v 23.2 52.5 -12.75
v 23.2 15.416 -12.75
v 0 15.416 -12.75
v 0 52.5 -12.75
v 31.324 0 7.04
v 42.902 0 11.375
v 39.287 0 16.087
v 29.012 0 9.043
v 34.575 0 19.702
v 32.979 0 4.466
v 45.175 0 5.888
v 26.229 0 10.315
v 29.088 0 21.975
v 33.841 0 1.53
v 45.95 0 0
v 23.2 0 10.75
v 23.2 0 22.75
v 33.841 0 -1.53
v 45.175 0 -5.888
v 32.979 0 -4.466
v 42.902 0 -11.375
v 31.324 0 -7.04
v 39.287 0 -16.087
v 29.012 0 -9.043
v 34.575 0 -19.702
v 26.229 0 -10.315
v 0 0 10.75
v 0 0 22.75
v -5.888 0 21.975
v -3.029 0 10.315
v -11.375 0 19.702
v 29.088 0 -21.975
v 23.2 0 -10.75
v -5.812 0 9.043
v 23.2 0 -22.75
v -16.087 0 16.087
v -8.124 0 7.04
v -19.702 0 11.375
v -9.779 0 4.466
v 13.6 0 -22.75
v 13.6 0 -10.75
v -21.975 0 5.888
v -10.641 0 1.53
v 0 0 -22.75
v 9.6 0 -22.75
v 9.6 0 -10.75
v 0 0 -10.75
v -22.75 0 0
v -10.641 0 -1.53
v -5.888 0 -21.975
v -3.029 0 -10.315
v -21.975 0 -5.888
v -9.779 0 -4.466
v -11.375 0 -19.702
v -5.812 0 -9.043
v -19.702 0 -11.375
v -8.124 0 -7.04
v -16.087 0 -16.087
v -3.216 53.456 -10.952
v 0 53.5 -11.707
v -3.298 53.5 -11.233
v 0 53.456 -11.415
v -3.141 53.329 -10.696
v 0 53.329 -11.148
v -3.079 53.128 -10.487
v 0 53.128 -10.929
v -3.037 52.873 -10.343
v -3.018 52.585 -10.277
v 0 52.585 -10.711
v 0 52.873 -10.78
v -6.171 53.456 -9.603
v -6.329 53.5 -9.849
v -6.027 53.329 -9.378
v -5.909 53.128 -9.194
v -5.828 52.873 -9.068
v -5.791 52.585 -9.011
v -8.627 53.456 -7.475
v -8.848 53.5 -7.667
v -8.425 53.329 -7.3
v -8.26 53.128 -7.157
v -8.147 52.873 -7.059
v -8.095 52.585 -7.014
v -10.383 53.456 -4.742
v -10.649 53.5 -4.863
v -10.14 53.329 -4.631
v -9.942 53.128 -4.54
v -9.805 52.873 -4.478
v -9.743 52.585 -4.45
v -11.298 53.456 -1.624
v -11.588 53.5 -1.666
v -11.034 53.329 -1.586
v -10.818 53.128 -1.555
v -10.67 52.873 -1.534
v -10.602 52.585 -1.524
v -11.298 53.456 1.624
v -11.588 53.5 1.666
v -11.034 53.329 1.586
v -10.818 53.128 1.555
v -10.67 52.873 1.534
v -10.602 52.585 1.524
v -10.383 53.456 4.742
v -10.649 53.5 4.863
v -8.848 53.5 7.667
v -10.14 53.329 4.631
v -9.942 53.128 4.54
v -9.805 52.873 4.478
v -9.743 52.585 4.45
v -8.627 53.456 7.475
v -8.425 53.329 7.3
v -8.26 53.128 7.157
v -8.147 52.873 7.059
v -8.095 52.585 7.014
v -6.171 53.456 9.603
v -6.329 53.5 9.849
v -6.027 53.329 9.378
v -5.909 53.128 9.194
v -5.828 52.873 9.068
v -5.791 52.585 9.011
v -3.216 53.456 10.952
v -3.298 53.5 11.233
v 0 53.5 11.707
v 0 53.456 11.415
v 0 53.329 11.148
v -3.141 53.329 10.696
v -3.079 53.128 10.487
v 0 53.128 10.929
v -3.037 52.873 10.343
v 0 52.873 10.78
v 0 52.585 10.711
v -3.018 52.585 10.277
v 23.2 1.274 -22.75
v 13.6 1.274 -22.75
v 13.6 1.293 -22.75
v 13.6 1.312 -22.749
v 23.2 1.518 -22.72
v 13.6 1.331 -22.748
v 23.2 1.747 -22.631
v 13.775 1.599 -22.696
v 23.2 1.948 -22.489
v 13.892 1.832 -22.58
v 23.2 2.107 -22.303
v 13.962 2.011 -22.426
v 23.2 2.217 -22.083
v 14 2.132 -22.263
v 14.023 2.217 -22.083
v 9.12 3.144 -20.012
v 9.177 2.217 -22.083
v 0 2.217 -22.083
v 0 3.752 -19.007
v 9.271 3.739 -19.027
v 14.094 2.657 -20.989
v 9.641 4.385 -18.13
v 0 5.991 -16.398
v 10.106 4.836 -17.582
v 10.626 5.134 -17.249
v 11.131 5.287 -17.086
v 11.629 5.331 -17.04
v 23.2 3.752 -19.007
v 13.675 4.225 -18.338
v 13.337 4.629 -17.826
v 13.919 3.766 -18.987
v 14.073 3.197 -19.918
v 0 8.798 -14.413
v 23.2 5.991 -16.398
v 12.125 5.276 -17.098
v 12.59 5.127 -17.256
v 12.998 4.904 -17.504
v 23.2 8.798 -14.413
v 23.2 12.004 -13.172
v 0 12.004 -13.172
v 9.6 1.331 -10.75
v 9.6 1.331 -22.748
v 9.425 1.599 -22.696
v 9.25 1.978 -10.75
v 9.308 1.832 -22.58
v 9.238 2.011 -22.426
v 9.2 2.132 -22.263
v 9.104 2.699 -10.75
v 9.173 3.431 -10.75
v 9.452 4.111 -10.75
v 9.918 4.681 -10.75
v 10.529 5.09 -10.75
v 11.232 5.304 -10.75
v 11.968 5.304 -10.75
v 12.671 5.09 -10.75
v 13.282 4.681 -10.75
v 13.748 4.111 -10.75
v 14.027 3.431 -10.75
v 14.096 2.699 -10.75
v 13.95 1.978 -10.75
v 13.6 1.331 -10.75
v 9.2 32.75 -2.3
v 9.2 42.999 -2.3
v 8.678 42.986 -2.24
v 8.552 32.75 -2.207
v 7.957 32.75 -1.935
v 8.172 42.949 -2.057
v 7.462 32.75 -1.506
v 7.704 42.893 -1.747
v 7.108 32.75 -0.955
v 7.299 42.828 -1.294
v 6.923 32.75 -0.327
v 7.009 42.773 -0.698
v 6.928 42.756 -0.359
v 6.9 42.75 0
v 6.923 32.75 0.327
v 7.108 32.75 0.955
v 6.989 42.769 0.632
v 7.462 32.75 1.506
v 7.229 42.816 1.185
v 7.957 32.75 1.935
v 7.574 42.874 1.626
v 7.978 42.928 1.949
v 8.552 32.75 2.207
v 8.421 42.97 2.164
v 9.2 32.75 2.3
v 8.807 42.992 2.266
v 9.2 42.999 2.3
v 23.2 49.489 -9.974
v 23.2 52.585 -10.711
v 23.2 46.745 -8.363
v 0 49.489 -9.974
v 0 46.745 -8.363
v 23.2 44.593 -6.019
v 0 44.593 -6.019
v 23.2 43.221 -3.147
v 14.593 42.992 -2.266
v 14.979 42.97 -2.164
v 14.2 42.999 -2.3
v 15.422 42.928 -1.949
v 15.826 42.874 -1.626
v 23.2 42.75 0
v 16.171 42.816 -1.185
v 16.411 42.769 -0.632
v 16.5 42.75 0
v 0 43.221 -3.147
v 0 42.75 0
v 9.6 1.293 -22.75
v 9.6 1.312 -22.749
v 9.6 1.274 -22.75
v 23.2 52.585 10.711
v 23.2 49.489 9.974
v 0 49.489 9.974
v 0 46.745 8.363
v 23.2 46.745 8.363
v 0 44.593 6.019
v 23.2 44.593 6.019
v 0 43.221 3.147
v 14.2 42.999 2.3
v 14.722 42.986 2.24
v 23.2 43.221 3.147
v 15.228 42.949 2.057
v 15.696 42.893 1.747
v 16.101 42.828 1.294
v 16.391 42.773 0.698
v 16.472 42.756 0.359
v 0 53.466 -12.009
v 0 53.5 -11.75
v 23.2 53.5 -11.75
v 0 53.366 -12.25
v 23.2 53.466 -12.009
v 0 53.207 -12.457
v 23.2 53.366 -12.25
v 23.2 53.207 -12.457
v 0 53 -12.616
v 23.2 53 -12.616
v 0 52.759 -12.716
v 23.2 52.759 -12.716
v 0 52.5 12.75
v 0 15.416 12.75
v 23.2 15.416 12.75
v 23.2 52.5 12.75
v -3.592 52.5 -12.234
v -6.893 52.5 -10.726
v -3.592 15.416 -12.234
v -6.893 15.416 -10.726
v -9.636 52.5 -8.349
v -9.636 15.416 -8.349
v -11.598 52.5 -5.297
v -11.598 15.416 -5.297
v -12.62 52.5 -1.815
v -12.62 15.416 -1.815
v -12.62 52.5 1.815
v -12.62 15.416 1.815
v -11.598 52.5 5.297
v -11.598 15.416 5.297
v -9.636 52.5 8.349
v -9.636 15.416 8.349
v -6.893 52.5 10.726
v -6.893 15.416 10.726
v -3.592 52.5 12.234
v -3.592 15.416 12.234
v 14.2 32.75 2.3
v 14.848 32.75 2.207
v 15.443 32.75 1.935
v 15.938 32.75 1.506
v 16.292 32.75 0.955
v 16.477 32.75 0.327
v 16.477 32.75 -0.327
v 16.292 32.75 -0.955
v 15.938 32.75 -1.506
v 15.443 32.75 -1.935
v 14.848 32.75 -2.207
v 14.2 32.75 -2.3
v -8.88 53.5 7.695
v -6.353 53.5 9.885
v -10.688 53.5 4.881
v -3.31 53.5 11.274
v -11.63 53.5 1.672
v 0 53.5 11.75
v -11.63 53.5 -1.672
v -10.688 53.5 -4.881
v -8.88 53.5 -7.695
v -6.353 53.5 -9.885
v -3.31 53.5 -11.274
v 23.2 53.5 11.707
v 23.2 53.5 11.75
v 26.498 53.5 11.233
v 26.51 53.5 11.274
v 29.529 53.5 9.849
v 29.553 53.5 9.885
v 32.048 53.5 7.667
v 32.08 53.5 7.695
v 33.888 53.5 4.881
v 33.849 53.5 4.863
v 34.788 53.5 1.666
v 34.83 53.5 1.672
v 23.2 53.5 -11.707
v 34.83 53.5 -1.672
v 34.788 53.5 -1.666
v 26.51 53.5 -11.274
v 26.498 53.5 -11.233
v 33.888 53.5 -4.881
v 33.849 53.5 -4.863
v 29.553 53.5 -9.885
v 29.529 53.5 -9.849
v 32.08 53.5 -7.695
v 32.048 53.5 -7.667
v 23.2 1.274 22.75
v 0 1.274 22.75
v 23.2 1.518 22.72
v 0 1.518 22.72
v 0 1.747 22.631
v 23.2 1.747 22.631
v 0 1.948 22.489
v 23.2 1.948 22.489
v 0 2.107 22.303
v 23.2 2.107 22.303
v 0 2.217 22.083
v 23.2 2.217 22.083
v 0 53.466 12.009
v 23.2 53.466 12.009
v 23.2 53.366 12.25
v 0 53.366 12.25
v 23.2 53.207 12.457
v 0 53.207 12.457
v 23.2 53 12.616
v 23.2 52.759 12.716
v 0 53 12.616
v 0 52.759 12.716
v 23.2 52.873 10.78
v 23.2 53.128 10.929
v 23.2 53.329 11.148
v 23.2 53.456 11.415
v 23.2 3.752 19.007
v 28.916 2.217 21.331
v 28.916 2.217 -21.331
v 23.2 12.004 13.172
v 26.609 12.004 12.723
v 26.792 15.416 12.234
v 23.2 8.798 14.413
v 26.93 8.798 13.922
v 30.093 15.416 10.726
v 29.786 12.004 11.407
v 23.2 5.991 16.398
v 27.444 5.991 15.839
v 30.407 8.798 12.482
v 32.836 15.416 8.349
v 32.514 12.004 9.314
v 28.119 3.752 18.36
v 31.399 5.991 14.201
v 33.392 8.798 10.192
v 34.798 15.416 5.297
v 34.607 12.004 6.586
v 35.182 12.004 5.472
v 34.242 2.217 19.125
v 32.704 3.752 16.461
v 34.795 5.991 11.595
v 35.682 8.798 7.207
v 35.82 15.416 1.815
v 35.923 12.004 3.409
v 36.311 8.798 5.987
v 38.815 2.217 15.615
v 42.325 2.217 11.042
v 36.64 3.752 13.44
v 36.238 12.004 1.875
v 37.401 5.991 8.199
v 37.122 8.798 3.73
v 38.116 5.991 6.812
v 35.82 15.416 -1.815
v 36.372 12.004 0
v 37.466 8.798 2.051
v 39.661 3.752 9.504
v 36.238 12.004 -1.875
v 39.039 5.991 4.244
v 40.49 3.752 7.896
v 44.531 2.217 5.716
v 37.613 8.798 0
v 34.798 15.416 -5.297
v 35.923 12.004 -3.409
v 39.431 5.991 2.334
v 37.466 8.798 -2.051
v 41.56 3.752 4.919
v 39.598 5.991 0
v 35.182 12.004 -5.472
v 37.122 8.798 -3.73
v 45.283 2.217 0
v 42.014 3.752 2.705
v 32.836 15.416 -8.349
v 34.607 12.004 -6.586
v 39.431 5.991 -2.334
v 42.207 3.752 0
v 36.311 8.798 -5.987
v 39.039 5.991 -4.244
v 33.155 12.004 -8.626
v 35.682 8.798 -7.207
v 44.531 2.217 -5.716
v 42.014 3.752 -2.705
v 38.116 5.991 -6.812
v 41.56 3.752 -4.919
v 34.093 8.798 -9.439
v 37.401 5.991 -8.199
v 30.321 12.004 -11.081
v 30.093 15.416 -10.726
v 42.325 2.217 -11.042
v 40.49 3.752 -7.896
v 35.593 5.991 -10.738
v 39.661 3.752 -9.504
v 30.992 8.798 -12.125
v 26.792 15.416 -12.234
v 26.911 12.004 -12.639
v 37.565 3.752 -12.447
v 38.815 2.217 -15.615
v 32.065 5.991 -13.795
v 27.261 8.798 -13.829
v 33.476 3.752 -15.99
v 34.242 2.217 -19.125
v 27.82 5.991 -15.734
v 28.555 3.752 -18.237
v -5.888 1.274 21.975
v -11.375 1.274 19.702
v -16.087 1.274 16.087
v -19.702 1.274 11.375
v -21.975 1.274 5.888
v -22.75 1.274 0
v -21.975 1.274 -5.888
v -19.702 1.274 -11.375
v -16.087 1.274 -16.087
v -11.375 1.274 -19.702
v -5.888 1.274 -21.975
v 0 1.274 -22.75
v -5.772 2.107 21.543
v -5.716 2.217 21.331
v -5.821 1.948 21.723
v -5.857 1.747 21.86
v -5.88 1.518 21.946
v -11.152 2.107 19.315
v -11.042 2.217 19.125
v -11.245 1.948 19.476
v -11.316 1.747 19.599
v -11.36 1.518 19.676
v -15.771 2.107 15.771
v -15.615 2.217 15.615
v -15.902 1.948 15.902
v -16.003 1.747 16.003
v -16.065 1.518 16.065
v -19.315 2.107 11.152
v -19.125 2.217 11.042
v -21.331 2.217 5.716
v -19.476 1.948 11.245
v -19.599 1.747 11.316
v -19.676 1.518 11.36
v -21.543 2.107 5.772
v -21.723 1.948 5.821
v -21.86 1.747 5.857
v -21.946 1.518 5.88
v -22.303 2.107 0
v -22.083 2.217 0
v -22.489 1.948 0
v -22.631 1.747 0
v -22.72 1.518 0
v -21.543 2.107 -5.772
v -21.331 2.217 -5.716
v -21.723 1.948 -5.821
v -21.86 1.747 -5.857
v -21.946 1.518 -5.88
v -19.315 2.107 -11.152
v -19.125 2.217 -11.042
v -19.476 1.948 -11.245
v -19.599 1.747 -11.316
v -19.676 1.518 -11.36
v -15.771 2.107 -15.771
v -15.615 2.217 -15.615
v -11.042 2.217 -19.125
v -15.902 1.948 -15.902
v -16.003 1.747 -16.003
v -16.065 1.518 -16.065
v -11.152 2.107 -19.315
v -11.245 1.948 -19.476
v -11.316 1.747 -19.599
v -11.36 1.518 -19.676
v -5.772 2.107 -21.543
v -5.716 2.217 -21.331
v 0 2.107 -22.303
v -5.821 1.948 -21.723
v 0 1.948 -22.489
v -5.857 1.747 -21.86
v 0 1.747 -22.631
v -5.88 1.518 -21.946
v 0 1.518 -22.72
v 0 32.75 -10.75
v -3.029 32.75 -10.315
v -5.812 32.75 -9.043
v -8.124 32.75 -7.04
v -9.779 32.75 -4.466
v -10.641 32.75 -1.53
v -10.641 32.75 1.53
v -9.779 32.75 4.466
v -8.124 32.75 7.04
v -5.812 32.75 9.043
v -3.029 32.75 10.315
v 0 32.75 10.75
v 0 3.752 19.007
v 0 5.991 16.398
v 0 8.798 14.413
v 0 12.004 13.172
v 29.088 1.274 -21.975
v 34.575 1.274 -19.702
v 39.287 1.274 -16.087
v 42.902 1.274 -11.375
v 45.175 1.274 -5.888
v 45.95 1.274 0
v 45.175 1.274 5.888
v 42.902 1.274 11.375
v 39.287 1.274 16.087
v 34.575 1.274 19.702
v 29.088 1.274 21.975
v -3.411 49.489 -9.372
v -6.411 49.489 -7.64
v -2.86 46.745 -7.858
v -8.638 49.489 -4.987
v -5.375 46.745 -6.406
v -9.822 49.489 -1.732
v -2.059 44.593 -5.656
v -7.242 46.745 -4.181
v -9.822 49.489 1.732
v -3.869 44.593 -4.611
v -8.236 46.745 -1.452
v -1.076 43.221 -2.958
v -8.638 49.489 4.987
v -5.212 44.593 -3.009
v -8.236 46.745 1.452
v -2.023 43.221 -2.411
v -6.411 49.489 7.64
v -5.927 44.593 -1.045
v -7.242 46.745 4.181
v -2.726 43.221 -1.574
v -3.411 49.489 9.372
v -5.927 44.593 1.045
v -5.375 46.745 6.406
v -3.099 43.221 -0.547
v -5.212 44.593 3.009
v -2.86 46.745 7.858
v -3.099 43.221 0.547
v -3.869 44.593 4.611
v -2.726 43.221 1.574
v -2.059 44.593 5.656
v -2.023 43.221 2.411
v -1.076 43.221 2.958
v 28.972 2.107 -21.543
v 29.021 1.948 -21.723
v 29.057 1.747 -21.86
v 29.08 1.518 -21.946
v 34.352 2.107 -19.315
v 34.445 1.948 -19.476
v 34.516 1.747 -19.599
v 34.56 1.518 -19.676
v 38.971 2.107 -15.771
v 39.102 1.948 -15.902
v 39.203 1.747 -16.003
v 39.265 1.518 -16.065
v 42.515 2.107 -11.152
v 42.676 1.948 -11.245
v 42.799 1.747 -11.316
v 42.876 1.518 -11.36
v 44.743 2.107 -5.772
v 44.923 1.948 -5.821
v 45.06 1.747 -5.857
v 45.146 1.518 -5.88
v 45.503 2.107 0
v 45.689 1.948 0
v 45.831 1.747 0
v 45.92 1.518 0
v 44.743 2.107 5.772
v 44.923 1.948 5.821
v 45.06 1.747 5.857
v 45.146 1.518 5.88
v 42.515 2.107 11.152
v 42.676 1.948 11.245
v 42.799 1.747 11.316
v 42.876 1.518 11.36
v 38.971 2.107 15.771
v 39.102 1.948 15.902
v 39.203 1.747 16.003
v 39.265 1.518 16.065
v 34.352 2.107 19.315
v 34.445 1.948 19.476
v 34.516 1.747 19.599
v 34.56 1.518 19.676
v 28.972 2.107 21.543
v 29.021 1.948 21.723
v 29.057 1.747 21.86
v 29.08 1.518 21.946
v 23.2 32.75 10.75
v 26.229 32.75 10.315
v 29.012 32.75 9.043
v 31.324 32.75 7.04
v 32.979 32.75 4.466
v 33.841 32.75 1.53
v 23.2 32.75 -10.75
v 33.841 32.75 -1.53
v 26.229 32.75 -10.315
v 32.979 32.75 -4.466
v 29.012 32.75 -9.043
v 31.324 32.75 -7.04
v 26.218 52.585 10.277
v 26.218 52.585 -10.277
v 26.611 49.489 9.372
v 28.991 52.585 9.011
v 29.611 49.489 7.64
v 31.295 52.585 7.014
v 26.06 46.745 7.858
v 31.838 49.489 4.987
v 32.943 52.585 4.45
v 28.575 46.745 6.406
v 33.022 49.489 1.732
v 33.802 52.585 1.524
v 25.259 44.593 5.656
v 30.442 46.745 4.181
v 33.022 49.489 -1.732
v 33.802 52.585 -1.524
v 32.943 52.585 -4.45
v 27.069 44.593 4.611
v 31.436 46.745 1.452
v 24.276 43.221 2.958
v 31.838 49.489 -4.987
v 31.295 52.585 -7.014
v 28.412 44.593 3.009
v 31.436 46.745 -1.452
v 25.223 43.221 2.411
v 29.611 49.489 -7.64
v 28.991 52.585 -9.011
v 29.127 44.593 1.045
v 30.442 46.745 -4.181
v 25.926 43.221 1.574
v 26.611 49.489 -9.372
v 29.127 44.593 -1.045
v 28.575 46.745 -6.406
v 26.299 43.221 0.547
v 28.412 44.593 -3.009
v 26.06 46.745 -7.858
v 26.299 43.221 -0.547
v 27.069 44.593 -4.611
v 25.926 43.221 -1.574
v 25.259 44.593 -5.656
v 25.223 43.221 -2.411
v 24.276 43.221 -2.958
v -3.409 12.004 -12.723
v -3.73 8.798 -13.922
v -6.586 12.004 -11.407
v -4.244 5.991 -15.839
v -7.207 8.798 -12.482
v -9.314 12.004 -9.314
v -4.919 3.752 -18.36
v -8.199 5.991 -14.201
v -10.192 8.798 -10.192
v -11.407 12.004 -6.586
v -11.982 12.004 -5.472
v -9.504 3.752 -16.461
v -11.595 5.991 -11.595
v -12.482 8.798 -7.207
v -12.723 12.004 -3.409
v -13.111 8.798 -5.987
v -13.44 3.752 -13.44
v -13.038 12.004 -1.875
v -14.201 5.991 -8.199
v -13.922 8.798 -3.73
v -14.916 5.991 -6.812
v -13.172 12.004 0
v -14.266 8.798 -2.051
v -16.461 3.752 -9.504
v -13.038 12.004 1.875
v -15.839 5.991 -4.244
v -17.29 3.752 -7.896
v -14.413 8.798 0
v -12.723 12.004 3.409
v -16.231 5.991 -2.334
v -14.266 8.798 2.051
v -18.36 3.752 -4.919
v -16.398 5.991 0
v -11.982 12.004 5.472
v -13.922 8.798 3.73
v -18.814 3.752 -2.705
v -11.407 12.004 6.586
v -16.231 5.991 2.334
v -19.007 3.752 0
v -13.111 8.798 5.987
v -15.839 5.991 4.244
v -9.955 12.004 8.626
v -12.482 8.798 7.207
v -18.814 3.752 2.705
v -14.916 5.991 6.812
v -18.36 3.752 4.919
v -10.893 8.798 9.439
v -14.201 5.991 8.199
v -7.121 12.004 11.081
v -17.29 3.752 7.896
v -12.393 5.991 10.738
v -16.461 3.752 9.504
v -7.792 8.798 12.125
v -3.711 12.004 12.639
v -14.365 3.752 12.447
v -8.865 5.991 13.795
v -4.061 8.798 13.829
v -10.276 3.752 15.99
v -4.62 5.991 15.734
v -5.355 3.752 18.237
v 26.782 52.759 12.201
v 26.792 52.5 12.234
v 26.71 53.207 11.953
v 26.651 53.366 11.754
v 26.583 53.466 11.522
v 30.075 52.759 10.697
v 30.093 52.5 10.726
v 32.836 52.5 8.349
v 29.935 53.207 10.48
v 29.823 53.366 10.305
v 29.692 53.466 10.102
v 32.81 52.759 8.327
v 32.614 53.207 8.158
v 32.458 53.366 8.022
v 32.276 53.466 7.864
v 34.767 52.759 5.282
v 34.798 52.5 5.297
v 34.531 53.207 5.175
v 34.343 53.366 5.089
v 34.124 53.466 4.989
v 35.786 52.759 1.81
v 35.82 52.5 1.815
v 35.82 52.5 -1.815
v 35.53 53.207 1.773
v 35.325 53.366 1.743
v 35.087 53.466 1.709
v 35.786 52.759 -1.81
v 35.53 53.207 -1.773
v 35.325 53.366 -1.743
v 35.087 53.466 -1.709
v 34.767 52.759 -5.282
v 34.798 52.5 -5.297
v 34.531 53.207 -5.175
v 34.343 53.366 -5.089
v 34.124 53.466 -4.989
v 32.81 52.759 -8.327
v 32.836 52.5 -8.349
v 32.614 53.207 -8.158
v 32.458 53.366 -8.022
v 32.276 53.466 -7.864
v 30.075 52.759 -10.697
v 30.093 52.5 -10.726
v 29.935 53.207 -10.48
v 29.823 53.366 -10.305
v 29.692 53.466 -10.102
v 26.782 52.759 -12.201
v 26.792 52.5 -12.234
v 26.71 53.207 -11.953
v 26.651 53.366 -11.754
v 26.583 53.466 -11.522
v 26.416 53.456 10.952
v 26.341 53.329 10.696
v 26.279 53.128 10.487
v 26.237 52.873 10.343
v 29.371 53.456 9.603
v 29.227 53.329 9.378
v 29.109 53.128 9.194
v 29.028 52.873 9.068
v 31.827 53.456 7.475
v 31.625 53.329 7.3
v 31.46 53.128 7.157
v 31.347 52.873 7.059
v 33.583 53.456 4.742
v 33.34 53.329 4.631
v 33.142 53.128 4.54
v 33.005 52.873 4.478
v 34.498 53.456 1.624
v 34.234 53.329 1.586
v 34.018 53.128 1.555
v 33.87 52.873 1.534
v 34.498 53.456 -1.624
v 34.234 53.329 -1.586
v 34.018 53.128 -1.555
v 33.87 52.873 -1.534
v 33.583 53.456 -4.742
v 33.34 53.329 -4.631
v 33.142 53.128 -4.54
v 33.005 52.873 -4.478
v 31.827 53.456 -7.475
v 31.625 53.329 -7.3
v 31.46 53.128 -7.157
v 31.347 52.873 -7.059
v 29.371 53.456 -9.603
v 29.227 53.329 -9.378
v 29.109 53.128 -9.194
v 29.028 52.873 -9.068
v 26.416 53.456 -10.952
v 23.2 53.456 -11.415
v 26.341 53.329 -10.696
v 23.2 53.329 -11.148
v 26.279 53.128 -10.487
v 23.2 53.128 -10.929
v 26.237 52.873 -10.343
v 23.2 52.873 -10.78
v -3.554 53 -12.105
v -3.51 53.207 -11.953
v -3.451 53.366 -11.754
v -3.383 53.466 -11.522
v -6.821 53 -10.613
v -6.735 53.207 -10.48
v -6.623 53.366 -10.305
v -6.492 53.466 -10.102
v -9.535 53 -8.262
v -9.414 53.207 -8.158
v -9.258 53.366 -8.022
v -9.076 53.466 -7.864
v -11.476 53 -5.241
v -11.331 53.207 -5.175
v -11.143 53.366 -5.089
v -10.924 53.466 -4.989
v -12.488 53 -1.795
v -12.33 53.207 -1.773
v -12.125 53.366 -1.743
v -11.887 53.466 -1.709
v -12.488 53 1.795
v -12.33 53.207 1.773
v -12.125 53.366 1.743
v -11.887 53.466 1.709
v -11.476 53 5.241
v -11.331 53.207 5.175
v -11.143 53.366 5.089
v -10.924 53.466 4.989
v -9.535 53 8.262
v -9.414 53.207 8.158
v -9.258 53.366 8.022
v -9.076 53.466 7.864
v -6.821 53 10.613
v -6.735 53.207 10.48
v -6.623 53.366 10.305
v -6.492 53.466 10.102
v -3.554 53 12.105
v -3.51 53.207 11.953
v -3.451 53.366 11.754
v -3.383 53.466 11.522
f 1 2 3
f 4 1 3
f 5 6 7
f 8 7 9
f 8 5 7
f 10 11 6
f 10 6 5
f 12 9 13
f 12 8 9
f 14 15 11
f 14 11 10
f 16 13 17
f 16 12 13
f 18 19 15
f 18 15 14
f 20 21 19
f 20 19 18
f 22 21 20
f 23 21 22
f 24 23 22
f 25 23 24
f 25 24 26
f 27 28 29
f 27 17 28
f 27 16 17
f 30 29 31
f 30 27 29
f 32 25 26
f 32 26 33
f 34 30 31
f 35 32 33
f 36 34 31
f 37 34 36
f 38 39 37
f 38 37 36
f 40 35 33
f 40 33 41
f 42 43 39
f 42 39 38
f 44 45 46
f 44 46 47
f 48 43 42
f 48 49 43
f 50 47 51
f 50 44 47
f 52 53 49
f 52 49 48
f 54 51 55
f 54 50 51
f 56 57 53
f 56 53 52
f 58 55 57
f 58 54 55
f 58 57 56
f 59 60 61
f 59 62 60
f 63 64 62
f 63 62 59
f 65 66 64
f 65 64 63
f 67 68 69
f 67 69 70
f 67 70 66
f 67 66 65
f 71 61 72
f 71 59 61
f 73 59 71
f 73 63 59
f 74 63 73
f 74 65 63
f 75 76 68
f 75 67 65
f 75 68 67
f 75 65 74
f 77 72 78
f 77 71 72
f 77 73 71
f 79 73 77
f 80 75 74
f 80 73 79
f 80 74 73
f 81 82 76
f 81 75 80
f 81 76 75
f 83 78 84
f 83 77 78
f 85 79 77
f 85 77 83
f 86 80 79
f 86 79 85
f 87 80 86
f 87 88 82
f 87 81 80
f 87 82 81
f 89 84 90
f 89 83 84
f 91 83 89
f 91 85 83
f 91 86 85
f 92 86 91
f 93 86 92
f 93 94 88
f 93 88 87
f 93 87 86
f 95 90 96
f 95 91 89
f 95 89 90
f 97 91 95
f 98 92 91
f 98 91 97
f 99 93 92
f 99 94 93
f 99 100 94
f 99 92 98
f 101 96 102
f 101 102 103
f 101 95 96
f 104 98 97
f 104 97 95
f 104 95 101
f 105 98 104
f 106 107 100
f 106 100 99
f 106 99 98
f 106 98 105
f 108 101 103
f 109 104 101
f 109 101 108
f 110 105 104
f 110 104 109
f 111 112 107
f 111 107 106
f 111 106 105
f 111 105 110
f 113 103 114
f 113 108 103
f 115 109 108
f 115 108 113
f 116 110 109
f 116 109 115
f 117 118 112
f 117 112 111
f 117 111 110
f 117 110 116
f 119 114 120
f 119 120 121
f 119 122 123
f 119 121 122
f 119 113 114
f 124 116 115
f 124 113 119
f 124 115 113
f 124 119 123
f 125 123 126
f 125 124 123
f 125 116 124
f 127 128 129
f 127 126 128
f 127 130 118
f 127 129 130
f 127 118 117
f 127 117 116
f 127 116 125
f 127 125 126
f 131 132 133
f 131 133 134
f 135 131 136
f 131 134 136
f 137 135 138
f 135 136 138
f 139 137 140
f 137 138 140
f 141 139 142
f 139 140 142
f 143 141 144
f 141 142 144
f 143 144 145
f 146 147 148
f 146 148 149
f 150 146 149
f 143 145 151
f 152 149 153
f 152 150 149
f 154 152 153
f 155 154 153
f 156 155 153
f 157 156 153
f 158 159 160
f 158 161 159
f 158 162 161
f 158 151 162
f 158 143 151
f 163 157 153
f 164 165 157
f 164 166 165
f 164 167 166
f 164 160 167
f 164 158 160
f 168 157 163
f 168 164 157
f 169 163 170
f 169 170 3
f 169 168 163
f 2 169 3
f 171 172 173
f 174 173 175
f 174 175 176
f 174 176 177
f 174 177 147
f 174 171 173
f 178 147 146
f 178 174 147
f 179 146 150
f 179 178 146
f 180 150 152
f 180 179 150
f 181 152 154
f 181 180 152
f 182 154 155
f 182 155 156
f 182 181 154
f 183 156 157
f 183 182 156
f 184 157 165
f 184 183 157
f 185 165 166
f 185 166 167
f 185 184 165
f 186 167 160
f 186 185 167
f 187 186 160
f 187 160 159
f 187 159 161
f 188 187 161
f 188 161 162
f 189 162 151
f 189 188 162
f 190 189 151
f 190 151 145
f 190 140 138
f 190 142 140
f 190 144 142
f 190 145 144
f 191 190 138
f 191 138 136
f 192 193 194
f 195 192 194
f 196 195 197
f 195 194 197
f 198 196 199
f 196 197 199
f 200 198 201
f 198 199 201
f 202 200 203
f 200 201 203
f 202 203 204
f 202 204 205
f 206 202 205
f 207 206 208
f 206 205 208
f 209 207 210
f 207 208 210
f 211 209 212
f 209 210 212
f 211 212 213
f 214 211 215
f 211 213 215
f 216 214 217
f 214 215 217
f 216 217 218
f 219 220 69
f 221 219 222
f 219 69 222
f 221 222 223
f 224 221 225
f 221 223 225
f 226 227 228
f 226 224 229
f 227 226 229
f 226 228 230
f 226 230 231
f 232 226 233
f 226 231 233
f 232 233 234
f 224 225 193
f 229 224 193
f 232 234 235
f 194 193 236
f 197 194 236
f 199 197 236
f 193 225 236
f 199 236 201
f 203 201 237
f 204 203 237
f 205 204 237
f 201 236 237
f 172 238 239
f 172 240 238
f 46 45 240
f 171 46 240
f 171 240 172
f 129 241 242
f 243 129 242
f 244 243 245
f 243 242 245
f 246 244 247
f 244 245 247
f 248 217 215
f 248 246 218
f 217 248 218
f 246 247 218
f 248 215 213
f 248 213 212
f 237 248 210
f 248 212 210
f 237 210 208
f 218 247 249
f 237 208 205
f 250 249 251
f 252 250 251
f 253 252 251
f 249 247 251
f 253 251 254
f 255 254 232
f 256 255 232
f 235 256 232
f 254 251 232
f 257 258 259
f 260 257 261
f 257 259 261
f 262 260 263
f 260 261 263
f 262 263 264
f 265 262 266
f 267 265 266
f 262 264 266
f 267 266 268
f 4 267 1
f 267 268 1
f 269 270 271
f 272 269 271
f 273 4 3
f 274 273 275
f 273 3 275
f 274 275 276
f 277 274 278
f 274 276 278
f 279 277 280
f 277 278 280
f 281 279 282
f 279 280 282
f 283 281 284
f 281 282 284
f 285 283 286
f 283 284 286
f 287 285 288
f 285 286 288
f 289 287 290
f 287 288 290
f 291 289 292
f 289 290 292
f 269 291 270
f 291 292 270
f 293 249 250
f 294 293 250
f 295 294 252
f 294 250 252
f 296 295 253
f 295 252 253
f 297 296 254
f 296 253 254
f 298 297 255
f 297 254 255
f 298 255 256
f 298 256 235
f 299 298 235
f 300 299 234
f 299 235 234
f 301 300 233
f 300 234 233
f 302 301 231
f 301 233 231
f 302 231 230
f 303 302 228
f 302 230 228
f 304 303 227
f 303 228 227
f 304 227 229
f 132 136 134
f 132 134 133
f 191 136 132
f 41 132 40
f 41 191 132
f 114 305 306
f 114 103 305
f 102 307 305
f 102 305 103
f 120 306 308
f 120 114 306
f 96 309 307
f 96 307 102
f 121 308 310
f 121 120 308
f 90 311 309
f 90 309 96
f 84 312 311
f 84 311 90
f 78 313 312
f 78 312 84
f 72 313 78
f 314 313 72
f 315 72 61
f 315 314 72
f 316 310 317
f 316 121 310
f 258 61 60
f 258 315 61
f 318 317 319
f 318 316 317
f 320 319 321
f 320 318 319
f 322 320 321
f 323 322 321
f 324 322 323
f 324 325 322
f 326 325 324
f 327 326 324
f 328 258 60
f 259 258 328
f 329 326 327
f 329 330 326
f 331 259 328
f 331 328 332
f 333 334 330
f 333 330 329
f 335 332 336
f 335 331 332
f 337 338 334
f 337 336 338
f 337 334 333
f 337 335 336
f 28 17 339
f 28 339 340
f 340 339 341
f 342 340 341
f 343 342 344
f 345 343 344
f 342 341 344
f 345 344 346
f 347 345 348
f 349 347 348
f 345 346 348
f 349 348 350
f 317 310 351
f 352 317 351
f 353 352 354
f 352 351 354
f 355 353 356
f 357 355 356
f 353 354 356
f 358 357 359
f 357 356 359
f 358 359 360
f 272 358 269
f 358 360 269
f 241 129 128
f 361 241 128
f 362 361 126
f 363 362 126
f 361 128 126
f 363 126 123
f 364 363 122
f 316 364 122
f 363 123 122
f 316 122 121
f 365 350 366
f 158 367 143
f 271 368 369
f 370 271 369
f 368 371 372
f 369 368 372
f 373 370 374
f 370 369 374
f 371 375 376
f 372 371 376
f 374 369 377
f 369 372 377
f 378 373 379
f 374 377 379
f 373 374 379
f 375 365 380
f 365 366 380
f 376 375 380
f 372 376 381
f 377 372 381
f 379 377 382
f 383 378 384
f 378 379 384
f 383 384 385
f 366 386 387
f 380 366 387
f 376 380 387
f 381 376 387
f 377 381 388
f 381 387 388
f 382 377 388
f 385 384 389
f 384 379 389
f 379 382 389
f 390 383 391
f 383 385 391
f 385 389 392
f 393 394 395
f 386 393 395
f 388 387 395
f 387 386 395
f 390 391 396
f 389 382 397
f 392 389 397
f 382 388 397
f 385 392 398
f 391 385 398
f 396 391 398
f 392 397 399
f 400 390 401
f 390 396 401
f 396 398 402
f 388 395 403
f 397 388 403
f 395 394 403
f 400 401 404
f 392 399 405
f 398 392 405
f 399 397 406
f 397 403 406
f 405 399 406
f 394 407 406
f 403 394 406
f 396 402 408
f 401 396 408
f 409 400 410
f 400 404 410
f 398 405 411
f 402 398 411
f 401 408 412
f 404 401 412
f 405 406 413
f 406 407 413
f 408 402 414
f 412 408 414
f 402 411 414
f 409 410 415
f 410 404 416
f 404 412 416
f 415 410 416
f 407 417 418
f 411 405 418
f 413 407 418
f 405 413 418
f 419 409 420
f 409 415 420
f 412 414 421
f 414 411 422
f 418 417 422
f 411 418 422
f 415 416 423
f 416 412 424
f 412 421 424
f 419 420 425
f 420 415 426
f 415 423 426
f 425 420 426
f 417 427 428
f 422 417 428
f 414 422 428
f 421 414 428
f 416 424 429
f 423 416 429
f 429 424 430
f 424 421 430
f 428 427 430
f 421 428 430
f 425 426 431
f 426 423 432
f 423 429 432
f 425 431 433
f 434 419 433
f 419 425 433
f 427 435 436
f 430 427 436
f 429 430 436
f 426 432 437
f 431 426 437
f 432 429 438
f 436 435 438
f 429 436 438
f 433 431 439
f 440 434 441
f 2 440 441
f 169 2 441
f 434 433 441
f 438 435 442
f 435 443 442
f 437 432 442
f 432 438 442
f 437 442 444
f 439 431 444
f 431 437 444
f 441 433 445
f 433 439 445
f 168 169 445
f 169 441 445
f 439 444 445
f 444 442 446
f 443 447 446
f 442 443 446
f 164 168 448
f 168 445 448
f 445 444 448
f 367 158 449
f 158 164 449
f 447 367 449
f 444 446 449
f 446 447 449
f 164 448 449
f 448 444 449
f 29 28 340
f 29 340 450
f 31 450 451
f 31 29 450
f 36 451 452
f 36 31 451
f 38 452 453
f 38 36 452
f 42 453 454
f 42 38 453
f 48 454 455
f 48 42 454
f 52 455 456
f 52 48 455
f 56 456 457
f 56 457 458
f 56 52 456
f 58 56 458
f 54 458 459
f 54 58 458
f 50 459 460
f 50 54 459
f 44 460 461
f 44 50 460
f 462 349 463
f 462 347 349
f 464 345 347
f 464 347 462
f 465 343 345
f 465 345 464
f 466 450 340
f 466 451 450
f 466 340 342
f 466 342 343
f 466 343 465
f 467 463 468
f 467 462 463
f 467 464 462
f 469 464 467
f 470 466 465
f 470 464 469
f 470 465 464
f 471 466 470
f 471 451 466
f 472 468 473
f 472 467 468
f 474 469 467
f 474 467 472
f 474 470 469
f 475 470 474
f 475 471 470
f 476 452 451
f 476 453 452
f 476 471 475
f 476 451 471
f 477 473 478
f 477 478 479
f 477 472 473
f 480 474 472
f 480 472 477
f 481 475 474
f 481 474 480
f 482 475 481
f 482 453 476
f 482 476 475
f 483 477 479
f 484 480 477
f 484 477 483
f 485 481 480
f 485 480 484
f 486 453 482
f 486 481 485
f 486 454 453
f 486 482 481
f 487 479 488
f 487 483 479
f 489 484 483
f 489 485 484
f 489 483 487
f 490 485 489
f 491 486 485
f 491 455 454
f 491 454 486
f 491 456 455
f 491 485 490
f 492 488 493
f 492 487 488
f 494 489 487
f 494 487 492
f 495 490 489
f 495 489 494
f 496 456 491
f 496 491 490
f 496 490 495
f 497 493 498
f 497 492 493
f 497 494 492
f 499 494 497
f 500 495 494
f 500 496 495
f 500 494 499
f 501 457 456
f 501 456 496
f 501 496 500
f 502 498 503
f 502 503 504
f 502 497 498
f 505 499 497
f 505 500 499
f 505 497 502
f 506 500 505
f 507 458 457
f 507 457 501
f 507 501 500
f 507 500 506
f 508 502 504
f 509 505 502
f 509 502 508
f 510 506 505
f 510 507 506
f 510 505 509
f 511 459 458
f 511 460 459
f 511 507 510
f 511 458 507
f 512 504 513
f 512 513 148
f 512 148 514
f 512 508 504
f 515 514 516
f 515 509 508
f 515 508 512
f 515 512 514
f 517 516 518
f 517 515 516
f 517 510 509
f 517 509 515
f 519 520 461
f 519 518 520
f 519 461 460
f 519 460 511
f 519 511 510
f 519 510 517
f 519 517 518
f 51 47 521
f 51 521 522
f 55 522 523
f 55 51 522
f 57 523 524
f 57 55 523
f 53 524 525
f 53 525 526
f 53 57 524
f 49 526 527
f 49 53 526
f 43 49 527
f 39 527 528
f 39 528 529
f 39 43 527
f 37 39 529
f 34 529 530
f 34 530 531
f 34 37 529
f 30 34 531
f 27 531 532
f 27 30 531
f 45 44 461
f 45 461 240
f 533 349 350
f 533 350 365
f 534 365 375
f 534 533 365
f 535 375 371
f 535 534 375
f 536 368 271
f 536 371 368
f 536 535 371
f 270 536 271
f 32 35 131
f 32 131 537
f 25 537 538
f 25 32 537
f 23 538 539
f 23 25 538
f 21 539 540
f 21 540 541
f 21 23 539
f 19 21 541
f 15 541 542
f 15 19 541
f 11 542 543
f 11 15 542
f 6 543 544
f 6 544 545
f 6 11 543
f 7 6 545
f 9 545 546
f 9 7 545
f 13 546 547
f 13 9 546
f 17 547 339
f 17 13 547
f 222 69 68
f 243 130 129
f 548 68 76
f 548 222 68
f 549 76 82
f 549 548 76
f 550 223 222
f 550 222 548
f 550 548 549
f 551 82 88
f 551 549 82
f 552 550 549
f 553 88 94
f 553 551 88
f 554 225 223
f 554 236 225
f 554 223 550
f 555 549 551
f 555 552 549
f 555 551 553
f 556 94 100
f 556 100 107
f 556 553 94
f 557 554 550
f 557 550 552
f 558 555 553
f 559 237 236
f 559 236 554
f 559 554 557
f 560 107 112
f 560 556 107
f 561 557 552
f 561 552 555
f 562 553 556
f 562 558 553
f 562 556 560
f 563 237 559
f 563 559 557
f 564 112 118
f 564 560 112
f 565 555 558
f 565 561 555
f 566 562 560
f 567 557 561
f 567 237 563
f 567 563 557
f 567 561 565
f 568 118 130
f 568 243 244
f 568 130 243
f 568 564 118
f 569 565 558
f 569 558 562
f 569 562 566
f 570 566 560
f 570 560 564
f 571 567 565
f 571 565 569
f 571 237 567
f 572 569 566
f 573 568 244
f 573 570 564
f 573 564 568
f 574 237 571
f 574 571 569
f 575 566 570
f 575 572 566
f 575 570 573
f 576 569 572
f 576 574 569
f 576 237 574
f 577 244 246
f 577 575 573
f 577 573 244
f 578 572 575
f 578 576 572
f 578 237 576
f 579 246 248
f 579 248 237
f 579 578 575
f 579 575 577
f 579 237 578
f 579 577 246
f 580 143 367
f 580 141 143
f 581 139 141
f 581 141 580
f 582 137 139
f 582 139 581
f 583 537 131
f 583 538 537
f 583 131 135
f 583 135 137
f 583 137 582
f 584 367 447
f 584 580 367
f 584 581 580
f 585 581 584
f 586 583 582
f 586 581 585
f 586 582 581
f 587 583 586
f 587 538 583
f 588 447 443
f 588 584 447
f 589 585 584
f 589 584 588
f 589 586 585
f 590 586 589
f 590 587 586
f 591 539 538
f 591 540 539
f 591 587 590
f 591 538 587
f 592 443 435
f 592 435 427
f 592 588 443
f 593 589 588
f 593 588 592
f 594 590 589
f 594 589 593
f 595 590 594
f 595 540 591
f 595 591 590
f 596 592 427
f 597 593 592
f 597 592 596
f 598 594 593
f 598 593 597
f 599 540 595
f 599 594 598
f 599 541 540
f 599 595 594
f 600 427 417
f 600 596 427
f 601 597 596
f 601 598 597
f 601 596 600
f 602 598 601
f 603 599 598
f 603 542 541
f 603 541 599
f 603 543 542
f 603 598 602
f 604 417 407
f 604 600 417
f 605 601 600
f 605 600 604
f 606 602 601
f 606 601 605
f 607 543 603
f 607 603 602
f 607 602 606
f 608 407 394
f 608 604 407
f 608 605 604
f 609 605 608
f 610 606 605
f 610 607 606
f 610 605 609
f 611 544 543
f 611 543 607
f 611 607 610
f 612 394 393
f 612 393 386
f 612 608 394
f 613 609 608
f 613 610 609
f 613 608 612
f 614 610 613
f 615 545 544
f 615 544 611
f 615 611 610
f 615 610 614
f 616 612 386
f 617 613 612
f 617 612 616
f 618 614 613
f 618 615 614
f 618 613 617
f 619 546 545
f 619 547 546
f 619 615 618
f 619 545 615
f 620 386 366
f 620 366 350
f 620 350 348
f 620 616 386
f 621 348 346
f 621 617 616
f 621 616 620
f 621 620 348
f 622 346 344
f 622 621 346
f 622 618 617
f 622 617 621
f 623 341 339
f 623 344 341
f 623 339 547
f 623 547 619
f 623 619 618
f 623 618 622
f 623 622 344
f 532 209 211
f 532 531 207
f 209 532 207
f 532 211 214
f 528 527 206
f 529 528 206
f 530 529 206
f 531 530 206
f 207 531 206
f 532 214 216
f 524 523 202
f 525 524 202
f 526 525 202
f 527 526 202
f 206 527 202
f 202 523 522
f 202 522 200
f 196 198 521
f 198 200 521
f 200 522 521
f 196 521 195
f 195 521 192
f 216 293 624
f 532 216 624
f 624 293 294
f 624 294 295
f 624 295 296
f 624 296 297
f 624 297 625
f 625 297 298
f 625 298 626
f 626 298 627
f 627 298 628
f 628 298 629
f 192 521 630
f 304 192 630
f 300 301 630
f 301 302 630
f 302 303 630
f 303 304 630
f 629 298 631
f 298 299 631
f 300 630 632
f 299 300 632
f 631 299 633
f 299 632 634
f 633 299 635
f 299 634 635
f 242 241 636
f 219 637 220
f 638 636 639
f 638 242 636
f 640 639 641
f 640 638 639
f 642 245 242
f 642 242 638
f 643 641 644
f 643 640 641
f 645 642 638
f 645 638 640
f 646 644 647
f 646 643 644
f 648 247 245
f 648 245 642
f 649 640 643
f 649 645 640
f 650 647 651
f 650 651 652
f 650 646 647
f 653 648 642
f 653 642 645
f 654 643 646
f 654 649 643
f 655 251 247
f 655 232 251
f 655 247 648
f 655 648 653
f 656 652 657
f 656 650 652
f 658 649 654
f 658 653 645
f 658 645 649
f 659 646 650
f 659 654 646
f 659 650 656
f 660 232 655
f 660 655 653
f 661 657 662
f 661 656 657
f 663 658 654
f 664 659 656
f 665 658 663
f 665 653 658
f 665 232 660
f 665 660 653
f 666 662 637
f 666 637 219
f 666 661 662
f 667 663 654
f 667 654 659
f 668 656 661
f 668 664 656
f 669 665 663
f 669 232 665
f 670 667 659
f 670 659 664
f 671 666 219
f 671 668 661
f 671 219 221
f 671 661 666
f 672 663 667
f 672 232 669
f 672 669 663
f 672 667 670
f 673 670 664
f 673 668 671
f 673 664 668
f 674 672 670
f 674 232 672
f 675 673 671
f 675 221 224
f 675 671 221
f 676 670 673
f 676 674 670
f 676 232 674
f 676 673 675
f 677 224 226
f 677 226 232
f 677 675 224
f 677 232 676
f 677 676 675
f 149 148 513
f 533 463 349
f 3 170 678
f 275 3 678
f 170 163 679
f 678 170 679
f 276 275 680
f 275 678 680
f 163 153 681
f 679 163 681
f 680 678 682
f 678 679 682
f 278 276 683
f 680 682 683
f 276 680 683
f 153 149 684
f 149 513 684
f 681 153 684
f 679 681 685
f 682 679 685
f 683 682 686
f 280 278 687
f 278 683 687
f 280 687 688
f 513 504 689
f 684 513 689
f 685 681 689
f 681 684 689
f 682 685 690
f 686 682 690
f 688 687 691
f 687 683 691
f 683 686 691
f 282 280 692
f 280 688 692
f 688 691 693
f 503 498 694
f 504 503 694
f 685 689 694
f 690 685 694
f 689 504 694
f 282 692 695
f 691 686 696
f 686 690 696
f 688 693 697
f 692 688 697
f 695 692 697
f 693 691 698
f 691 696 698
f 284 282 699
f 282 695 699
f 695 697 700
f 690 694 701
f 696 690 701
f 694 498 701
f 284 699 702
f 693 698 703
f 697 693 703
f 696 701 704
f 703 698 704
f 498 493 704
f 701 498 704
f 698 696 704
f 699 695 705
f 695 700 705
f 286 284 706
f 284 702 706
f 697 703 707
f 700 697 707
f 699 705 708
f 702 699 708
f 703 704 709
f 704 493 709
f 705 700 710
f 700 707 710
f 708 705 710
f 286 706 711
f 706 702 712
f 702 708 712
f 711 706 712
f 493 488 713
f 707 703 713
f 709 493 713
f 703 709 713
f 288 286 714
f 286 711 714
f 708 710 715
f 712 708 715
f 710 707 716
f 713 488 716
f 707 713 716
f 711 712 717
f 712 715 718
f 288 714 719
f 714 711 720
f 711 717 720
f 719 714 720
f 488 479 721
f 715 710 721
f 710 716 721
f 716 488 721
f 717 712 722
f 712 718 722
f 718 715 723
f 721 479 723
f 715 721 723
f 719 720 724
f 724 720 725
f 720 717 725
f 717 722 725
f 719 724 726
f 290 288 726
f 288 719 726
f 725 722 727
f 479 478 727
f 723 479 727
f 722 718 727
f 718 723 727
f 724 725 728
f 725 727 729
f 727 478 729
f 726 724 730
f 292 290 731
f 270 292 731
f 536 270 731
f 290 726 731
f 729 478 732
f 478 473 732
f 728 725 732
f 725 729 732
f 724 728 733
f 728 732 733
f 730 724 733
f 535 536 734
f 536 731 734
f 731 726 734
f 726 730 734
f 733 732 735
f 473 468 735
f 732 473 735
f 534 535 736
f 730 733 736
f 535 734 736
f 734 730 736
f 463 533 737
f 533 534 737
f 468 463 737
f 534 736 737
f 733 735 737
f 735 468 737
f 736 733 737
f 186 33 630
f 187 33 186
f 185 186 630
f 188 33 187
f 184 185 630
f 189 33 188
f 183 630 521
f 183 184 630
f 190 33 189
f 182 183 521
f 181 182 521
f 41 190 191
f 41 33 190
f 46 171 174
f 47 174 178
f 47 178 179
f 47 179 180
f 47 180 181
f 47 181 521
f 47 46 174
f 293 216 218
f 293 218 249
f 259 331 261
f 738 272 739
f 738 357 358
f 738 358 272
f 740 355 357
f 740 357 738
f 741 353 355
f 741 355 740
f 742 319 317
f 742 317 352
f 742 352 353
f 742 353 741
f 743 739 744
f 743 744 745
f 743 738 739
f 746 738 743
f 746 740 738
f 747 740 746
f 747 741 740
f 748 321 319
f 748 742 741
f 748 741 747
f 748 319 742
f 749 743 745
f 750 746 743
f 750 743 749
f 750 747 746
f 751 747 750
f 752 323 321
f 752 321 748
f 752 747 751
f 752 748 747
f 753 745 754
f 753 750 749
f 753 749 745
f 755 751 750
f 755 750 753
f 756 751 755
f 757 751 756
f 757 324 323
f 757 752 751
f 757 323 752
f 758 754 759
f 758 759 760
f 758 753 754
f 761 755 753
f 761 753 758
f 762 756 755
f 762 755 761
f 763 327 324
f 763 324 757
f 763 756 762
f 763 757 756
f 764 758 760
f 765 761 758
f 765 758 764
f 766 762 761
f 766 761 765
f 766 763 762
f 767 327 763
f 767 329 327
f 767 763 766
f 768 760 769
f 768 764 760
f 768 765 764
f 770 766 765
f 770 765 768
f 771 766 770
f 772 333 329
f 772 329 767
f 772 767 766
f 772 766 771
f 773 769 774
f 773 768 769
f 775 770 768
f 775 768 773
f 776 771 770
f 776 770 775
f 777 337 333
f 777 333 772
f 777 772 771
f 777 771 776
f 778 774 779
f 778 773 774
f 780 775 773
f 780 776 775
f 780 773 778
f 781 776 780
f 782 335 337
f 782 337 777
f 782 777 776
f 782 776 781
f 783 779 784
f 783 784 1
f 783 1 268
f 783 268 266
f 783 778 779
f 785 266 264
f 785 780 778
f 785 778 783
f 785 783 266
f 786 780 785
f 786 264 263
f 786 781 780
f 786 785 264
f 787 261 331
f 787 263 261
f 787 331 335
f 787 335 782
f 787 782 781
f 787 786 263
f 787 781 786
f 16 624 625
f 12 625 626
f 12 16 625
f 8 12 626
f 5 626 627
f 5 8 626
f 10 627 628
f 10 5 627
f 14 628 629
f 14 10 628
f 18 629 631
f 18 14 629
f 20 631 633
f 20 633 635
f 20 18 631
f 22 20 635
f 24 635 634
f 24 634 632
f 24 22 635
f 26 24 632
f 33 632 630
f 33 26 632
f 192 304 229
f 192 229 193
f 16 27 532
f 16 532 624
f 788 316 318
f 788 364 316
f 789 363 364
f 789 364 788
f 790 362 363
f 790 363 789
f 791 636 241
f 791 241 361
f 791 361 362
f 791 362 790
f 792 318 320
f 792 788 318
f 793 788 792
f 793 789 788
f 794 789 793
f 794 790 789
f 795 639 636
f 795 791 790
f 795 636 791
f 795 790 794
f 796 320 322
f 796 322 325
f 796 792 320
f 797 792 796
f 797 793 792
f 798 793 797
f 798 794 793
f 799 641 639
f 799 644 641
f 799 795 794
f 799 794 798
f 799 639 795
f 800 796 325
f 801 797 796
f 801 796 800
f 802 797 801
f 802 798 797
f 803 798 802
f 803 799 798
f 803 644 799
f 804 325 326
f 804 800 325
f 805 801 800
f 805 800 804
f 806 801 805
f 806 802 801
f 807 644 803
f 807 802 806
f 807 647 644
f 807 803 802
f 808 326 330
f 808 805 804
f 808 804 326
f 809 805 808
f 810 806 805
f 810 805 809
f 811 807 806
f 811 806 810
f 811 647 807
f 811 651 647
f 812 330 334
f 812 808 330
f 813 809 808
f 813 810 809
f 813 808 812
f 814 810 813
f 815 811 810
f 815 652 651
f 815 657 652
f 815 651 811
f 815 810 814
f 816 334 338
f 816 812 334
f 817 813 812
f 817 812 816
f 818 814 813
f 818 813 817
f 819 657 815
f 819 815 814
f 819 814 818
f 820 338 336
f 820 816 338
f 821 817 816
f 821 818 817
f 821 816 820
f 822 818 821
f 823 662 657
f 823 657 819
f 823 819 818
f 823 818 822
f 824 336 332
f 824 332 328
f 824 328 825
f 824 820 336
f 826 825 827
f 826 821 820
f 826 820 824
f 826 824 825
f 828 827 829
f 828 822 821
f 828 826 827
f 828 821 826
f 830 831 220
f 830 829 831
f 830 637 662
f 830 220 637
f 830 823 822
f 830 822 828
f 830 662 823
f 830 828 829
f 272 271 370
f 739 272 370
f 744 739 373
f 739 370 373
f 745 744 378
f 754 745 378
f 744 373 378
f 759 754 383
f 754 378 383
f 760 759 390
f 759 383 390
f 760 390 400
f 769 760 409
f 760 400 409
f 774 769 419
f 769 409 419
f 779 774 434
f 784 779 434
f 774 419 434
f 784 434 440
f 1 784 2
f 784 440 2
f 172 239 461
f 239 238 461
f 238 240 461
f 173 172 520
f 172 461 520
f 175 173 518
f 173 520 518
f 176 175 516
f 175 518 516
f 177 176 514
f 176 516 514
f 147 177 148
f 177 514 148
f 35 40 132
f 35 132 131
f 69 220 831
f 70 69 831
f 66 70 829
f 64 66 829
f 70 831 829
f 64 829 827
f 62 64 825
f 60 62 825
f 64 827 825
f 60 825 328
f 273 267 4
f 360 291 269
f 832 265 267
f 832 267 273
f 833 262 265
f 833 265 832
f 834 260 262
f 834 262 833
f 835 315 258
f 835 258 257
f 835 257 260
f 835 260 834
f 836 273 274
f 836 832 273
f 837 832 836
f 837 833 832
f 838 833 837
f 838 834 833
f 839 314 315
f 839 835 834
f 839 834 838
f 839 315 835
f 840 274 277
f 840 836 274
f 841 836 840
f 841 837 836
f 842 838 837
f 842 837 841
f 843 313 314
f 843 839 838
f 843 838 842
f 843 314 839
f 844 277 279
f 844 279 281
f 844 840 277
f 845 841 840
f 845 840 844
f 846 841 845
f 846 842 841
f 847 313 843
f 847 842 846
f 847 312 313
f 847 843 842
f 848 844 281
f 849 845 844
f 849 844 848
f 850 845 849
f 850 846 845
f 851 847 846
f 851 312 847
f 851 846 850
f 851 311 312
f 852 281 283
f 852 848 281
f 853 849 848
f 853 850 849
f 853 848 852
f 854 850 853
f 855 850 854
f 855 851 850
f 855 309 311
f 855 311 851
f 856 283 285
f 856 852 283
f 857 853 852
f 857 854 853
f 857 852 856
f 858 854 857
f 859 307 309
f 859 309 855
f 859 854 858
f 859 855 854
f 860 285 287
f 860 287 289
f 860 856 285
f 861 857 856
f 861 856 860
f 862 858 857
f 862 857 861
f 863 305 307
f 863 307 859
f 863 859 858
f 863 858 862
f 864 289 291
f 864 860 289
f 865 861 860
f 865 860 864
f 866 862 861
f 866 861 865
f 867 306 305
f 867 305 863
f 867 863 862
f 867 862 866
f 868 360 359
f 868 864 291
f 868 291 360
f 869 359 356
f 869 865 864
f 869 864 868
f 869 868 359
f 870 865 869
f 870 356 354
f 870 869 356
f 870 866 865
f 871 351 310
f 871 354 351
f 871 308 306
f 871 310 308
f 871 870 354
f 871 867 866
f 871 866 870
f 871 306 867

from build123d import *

# Parameters (mm, degrees)
BOSS_EXTRUDE1_DEPTH     = 53.5
BOSS_EXTRUDE2_START     = 32.75
BOSS_EXTRUDE2_DEPTH     = 10
BOSS_EXTRUDE3_DEPTH     = 2
FILLET1_R               = 10.75
FILLET2_R               = 14
FILLET3_R               = 1
CUT_EXTRUDE4_DEPTH      = 79.076260797
CUT_EXTRUDE5_DEPTH      = 61.840180017
CUT_EXTRUDE5_DEPTH_BACK = 61.840180017


# Some blends are built 0.0001 mm under size
with BuildPart() as part:
    # Sketch2 → Boss-Extrude1 (new body)
    with BuildSketch(Plane(origin=(0, 0, 0), x_dir=(1, 0, 0), z_dir=(0, 1, 0))):
        with BuildLine():
            Line((0, -12.75), (23.2, -12.75))
            ThreePointArc((23.2, -12.75), (35.95, 0), (23.2, 12.75))
            Line((23.2, 12.75), (0, 12.75))
            ThreePointArc((0, 12.75), (-12.75, 0), (0, -12.75))
        make_face()
        with BuildLine():
            ThreePointArc((23.2, -10.75), (33.95, 0), (23.2, 10.75))
            Line((23.2, 10.75), (0, 10.75))
            ThreePointArc((0, 10.75), (-10.75, 0), (0, -10.75))
            Line((0, -10.75), (23.2, -10.75))
        make_face(mode=Mode.SUBTRACT)
    extrude(amount=BOSS_EXTRUDE1_DEPTH)

    # Sketch2<3> → Boss-Extrude2 (add)
    with BuildSketch(Plane(origin=(0, 0, 0), x_dir=(1, 0, 0), z_dir=(0, 1, 0)).offset(BOSS_EXTRUDE2_START)):
        with BuildLine():
            Line((0, -10.75), (23.2, -10.75))
            ThreePointArc((23.2, -10.75), (33.95, 0), (23.2, 10.75))
            Line((23.2, 10.75), (0, 10.75))
            ThreePointArc((0, 10.75), (-10.75, 0), (0, -10.75))
        make_face()
    extrude(amount=BOSS_EXTRUDE2_DEPTH)

    # Sketch2<4> → Boss-Extrude3 (add)
    with BuildSketch(Plane(origin=(0, 0, 0), x_dir=(1, 0, 0), z_dir=(0, 1, 0))):
        with BuildLine():
            Line((0, 22.75), (23.2, 22.75))
            ThreePointArc((23.2, 22.75), (45.95, 0), (23.2, -22.75))
            Line((23.2, -22.75), (0, -22.75))
            ThreePointArc((0, -22.75), (-22.75, 0), (0, 22.75))
        make_face()
        with BuildLine():
            ThreePointArc((23.2, -12.75), (35.95, 0), (23.2, 12.75))
            Line((23.2, 12.75), (0, 12.75))
            ThreePointArc((0, 12.75), (-12.75, 0), (0, -12.75))
            Line((0, -12.75), (23.2, -12.75))
        make_face(mode=Mode.SUBTRACT)
    extrude(amount=BOSS_EXTRUDE3_DEPTH)

    # Fillet1
    fillet1_edges = [part.edges().sort_by_distance(p)[0] for p in [
        (11.6, 42.75, -10.75),
        (33.95, 42.75, 0),
        (11.6, 42.75, 10.75),
        (-10.75, 42.75, 0),
    ]]
    fillet(fillet1_edges, radius=FILLET1_R - 0.0001)  # a hair under: the kernel refuses the full size

    # Fillet2
    # the kernel refuses this fillet: 14 mm, written as the material it adds along each edge
    with BuildSketch(Plane(origin=(23.2, 2, 0), x_dir=(0, 0, 1), z_dir=(-1, 0, 0))) as fillet2_piece_1:
        with BuildLine():
            CenterArc((26.75, 13.416407865), FILLET2_R, 180, 73.398450401)
            Line((22.75, 0), (22.67, -0.268328157))
            ThreePointArc((22.67, -0.268328157), (17.75, -0.28), (12.75, -0.28))
            Line((12.75, -0.28), (12.47, 0))
            Line((12.47, 0), (12.47, 13.416407865))
            Line((12.47, 13.416407865), (12.75, 13.416407865))
        make_face()
    revolve(axis=Axis((23.2, 2, 0), (0, 1, 0)), revolution_arc=180)
    with BuildSketch(Plane(origin=(0, 2, 12.75), x_dir=(0, 1, 0), z_dir=(1, 0, 0)), Plane(origin=(23.2, 2, -12.75), x_dir=(0, 1, 0), z_dir=(-1, 0, 0))) as fillet2_piece_2:
        with BuildLine():
            CenterArc((13.416407865, 14), FILLET2_R, 196.601549599, 73.398450401)
            Line((0, 10), (-0.268328157, 9.92))
            ThreePointArc((-0.268328157, 9.92), (-0.28, 5), (-0.28, 0))
            Line((-0.28, 0), (0, -0.28))
            Line((0, -0.28), (13.416407865, -0.28))
            Line((13.416407865, -0.28), (13.416407865, 0))
        make_face()
    extrude(amount=23.2)
    with BuildSketch(Plane(origin=(0, 2, 0), x_dir=(0, 0, -1), z_dir=(1, 0, 0))) as fillet2_piece_3:
        with BuildLine():
            CenterArc((26.75, 13.416407865), FILLET2_R, 180, 73.398450401)
            Line((22.75, 0), (22.67, -0.268328157))
            ThreePointArc((22.67, -0.268328157), (17.75, -0.28), (12.75, -0.28))
            Line((12.75, -0.28), (12.47, 0))
            Line((12.47, 0), (12.47, 13.416407865))
            Line((12.47, 13.416407865), (12.75, 13.416407865))
        make_face()
    revolve(axis=Axis((0, 2, 0), (0, 1, 0)), revolution_arc=180)

    # Fillet3
    # the kernel refuses this fillet: 1 mm, written as the material it takes off along each edge
    with BuildSketch(Plane(origin=(0, 53.5, 10.75), x_dir=(0, 0, 1), z_dir=(1, 0, 0)), Plane(origin=(23.2, 53.5, -10.75), x_dir=(0, 0, -1), z_dir=(-1, 0, 0))) as fillet3_piece_1:
        with BuildLine():
            CenterArc((0.957377651, 1), FILLET3_R, 184.881694581, 85.118305419)
            Line((-0.038994884, 0.914901403), (-0.138632138, 0.906391544))
            ThreePointArc((-0.138632138, 0.906391544), (-0.1, 0.0001), (-0.1, 0))
            Line((-0.1, 0), (0, -0.1))
            Line((0, -0.1), (0.957377651, -0.1))
            Line((0.957377651, -0.1), (0.957377651, 0))
        make_face()
    extrude(amount=23.2, mode=Mode.SUBTRACT)
    with BuildSketch(Plane(origin=(0, 53.5, 0), x_dir=(0, 0, -1), z_dir=(1, 0, 0))) as fillet3_piece_2:
        with BuildLine():
            CenterArc((11.707377651, -1), FILLET3_R, 90, 85.118305419)
            Line((10.711005116, -0.914901403), (10.611367862, -0.906391544))
            ThreePointArc((10.611367862, -0.906391544), (10.65, -0.0001), (10.65, 0))
            Line((10.65, 0), (10.75, 0.1))
            Line((10.75, 0.1), (11.707377651, 0.1))
            Line((11.707377651, 0.1), (11.707377651, 0))
        make_face()
    revolve(axis=Axis((0, 53.5, 0), (0, 1, 0)), revolution_arc=180, mode=Mode.SUBTRACT)
    with BuildSketch(Plane(origin=(0, 53.5, 12.75), x_dir=(0, -1, 0), z_dir=(1, 0, 0))) as fillet3_piece_3:
        with BuildLine():
            CenterArc((FILLET3_R, FILLET3_R), FILLET3_R, 180, 90)
            Line((0, FILLET3_R), (0, 0))
            Line((0, 0), (FILLET3_R, 0))
        make_face()
    extrude(amount=23.2, mode=Mode.SUBTRACT)
    with BuildSketch(Plane(origin=(23.2, 53.5, 0), x_dir=(0, 0, 1), z_dir=(-1, 0, 0))) as fillet3_piece_4:
        with BuildLine():
            CenterArc((12.75 - FILLET3_R, -FILLET3_R), FILLET3_R, 0, 90)
            Line((12.75, -FILLET3_R), (12.75, 0))
            Line((12.75, 0), (12.75 - FILLET3_R, 0))
        make_face()
    revolve(axis=Axis((23.2, 53.5, 0), (0, 1, 0)), revolution_arc=180, mode=Mode.SUBTRACT)
    with BuildSketch(Plane(origin=(23.2, 53.5, -12.75), x_dir=(0, 0, 1), z_dir=(-1, 0, 0))) as fillet3_piece_5:
        with BuildLine():
            CenterArc((FILLET3_R, -FILLET3_R), FILLET3_R, 90, 90)
            Line((0, -FILLET3_R), (0, 0))
            Line((0, 0), (FILLET3_R, 0))
        make_face()
    extrude(amount=23.2, mode=Mode.SUBTRACT)
    with BuildSketch(Plane(origin=(0, 53.5, 0), x_dir=(0, 0, -1), z_dir=(1, 0, 0))) as fillet3_piece_6:
        with BuildLine():
            CenterArc((12.75 - FILLET3_R, -FILLET3_R), FILLET3_R, 0, 90)
            Line((12.75 - FILLET3_R, 0), (12.75, 0))
            Line((12.75, 0), (12.75, -FILLET3_R))
        make_face()
    revolve(axis=Axis((0, 53.5, 0), (0, 1, 0)), revolution_arc=180, mode=Mode.SUBTRACT)
    with BuildSketch(Plane(origin=(0, 2, -22.75), x_dir=(0, 0.30962089103713925, 0.9508600863604318), z_dir=(1, 0, 0)), Plane(origin=(23.2, 2, 22.75), x_dir=(0, 0.30962089103713925, -0.9508600863604318), z_dir=(-1, 0, 0))) as fillet3_piece_7:
        with BuildLine():
            CenterArc((0.726159611, 0.99968645), FILLET3_R, 198.036385117, 70.528779366)
            Line((-0.224700475, 0.690065559), (0, 0))
            ThreePointArc((0, 0), (0.350559812, 0.004389695), (0.701119624, 0))
        make_face()
    extrude(amount=23.2, mode=Mode.SUBTRACT)
    with BuildSketch(Plane(origin=(0, 2, 0), x_dir=(0, 0, 1), z_dir=(1, 0, 0))) as fillet3_piece_8:
        with BuildLine():
            CenterArc((21.75, 0.725727759), FILLET3_R, 289.471220634, 70.528779366)
            Line((22.75, 0.725727759), (22.75, 0))
            ThreePointArc((22.75, 0), (22.415307525, -0.104366656), (22.083333333, -0.217081283))
        make_face()
    revolve(axis=Axis((0, 2, 0), (0, -1, 0)), revolution_arc=180, mode=Mode.SUBTRACT)
    with BuildSketch(Plane(origin=(23.2, 2, 0), x_dir=(0, 0, -1), z_dir=(-1, 0, 0))) as fillet3_piece_9:
        with BuildLine():
            CenterArc((21.75, 0.725727759), FILLET3_R, 289.471220634, 70.528779366)
            Line((22.75, 0.725727759), (22.75, 0))
            ThreePointArc((22.75, 0), (22.415307525, -0.104366656), (22.083333333, -0.217081283))
        make_face()
    revolve(axis=Axis((23.2, 2, 0), (0, -1, 0)), revolution_arc=180, mode=Mode.SUBTRACT)
    with BuildSketch(Plane(origin=(23.2, 53.5, 0), x_dir=(0, 0, 1), z_dir=(-1, 0, 0))) as fillet3_piece_10:
        with BuildLine():
            CenterArc((11.707377651, -1), FILLET3_R, 90, 85.118305419)
            Line((10.711005116, -0.914901403), (10.611367862, -0.906391544))
            ThreePointArc((10.611367862, -0.906391544), (10.65, -0.0001), (10.65, 0))
            Line((10.65, 0), (10.75, 0.1))
            Line((10.75, 0.1), (11.707377651, 0.1))
            Line((11.707377651, 0.1), (11.707377651, 0))
        make_face()
    revolve(axis=Axis((23.2, 53.5, 0), (0, 1, 0)), revolution_arc=180, mode=Mode.SUBTRACT)

    # Sketch4 → Cut-Extrude4 (cut, through all)
    with BuildSketch(Plane.XY.offset(-10.75)):
        with BuildLine():
            Line((13.6, 0), (9.6, 0))
            Line((9.6, 0), (9.6, 1.331324862))
            ThreePointArc((9.6, 1.331324862), (11.6, 5.331324862), (13.6, 1.331324862))
            Line((13.6, 1.331324862), (13.6, 0))
        make_face()
    extrude(amount=-CUT_EXTRUDE4_DEPTH, mode=Mode.SUBTRACT)

    # Sketch3 → Cut-Extrude5 (cut, two sides: drawn at the far end of the back side and taken through both)
    with BuildSketch(Plane.XZ.offset(-32.75).offset(-CUT_EXTRUDE5_DEPTH_BACK)):
        with BuildLine():
            Line((9.2, 2.3), (14.2, 2.3))
            ThreePointArc((14.2, 2.3), (16.5, 0), (14.2, -2.3))
            Line((14.2, -2.3), (9.2, -2.3))
            ThreePointArc((9.2, -2.3), (6.9, 0), (9.2, 2.3))
        make_face()
    extrude(amount=CUT_EXTRUDE5_DEPTH + CUT_EXTRUDE5_DEPTH_BACK, mode=Mode.SUBTRACT)


solid = part.part
